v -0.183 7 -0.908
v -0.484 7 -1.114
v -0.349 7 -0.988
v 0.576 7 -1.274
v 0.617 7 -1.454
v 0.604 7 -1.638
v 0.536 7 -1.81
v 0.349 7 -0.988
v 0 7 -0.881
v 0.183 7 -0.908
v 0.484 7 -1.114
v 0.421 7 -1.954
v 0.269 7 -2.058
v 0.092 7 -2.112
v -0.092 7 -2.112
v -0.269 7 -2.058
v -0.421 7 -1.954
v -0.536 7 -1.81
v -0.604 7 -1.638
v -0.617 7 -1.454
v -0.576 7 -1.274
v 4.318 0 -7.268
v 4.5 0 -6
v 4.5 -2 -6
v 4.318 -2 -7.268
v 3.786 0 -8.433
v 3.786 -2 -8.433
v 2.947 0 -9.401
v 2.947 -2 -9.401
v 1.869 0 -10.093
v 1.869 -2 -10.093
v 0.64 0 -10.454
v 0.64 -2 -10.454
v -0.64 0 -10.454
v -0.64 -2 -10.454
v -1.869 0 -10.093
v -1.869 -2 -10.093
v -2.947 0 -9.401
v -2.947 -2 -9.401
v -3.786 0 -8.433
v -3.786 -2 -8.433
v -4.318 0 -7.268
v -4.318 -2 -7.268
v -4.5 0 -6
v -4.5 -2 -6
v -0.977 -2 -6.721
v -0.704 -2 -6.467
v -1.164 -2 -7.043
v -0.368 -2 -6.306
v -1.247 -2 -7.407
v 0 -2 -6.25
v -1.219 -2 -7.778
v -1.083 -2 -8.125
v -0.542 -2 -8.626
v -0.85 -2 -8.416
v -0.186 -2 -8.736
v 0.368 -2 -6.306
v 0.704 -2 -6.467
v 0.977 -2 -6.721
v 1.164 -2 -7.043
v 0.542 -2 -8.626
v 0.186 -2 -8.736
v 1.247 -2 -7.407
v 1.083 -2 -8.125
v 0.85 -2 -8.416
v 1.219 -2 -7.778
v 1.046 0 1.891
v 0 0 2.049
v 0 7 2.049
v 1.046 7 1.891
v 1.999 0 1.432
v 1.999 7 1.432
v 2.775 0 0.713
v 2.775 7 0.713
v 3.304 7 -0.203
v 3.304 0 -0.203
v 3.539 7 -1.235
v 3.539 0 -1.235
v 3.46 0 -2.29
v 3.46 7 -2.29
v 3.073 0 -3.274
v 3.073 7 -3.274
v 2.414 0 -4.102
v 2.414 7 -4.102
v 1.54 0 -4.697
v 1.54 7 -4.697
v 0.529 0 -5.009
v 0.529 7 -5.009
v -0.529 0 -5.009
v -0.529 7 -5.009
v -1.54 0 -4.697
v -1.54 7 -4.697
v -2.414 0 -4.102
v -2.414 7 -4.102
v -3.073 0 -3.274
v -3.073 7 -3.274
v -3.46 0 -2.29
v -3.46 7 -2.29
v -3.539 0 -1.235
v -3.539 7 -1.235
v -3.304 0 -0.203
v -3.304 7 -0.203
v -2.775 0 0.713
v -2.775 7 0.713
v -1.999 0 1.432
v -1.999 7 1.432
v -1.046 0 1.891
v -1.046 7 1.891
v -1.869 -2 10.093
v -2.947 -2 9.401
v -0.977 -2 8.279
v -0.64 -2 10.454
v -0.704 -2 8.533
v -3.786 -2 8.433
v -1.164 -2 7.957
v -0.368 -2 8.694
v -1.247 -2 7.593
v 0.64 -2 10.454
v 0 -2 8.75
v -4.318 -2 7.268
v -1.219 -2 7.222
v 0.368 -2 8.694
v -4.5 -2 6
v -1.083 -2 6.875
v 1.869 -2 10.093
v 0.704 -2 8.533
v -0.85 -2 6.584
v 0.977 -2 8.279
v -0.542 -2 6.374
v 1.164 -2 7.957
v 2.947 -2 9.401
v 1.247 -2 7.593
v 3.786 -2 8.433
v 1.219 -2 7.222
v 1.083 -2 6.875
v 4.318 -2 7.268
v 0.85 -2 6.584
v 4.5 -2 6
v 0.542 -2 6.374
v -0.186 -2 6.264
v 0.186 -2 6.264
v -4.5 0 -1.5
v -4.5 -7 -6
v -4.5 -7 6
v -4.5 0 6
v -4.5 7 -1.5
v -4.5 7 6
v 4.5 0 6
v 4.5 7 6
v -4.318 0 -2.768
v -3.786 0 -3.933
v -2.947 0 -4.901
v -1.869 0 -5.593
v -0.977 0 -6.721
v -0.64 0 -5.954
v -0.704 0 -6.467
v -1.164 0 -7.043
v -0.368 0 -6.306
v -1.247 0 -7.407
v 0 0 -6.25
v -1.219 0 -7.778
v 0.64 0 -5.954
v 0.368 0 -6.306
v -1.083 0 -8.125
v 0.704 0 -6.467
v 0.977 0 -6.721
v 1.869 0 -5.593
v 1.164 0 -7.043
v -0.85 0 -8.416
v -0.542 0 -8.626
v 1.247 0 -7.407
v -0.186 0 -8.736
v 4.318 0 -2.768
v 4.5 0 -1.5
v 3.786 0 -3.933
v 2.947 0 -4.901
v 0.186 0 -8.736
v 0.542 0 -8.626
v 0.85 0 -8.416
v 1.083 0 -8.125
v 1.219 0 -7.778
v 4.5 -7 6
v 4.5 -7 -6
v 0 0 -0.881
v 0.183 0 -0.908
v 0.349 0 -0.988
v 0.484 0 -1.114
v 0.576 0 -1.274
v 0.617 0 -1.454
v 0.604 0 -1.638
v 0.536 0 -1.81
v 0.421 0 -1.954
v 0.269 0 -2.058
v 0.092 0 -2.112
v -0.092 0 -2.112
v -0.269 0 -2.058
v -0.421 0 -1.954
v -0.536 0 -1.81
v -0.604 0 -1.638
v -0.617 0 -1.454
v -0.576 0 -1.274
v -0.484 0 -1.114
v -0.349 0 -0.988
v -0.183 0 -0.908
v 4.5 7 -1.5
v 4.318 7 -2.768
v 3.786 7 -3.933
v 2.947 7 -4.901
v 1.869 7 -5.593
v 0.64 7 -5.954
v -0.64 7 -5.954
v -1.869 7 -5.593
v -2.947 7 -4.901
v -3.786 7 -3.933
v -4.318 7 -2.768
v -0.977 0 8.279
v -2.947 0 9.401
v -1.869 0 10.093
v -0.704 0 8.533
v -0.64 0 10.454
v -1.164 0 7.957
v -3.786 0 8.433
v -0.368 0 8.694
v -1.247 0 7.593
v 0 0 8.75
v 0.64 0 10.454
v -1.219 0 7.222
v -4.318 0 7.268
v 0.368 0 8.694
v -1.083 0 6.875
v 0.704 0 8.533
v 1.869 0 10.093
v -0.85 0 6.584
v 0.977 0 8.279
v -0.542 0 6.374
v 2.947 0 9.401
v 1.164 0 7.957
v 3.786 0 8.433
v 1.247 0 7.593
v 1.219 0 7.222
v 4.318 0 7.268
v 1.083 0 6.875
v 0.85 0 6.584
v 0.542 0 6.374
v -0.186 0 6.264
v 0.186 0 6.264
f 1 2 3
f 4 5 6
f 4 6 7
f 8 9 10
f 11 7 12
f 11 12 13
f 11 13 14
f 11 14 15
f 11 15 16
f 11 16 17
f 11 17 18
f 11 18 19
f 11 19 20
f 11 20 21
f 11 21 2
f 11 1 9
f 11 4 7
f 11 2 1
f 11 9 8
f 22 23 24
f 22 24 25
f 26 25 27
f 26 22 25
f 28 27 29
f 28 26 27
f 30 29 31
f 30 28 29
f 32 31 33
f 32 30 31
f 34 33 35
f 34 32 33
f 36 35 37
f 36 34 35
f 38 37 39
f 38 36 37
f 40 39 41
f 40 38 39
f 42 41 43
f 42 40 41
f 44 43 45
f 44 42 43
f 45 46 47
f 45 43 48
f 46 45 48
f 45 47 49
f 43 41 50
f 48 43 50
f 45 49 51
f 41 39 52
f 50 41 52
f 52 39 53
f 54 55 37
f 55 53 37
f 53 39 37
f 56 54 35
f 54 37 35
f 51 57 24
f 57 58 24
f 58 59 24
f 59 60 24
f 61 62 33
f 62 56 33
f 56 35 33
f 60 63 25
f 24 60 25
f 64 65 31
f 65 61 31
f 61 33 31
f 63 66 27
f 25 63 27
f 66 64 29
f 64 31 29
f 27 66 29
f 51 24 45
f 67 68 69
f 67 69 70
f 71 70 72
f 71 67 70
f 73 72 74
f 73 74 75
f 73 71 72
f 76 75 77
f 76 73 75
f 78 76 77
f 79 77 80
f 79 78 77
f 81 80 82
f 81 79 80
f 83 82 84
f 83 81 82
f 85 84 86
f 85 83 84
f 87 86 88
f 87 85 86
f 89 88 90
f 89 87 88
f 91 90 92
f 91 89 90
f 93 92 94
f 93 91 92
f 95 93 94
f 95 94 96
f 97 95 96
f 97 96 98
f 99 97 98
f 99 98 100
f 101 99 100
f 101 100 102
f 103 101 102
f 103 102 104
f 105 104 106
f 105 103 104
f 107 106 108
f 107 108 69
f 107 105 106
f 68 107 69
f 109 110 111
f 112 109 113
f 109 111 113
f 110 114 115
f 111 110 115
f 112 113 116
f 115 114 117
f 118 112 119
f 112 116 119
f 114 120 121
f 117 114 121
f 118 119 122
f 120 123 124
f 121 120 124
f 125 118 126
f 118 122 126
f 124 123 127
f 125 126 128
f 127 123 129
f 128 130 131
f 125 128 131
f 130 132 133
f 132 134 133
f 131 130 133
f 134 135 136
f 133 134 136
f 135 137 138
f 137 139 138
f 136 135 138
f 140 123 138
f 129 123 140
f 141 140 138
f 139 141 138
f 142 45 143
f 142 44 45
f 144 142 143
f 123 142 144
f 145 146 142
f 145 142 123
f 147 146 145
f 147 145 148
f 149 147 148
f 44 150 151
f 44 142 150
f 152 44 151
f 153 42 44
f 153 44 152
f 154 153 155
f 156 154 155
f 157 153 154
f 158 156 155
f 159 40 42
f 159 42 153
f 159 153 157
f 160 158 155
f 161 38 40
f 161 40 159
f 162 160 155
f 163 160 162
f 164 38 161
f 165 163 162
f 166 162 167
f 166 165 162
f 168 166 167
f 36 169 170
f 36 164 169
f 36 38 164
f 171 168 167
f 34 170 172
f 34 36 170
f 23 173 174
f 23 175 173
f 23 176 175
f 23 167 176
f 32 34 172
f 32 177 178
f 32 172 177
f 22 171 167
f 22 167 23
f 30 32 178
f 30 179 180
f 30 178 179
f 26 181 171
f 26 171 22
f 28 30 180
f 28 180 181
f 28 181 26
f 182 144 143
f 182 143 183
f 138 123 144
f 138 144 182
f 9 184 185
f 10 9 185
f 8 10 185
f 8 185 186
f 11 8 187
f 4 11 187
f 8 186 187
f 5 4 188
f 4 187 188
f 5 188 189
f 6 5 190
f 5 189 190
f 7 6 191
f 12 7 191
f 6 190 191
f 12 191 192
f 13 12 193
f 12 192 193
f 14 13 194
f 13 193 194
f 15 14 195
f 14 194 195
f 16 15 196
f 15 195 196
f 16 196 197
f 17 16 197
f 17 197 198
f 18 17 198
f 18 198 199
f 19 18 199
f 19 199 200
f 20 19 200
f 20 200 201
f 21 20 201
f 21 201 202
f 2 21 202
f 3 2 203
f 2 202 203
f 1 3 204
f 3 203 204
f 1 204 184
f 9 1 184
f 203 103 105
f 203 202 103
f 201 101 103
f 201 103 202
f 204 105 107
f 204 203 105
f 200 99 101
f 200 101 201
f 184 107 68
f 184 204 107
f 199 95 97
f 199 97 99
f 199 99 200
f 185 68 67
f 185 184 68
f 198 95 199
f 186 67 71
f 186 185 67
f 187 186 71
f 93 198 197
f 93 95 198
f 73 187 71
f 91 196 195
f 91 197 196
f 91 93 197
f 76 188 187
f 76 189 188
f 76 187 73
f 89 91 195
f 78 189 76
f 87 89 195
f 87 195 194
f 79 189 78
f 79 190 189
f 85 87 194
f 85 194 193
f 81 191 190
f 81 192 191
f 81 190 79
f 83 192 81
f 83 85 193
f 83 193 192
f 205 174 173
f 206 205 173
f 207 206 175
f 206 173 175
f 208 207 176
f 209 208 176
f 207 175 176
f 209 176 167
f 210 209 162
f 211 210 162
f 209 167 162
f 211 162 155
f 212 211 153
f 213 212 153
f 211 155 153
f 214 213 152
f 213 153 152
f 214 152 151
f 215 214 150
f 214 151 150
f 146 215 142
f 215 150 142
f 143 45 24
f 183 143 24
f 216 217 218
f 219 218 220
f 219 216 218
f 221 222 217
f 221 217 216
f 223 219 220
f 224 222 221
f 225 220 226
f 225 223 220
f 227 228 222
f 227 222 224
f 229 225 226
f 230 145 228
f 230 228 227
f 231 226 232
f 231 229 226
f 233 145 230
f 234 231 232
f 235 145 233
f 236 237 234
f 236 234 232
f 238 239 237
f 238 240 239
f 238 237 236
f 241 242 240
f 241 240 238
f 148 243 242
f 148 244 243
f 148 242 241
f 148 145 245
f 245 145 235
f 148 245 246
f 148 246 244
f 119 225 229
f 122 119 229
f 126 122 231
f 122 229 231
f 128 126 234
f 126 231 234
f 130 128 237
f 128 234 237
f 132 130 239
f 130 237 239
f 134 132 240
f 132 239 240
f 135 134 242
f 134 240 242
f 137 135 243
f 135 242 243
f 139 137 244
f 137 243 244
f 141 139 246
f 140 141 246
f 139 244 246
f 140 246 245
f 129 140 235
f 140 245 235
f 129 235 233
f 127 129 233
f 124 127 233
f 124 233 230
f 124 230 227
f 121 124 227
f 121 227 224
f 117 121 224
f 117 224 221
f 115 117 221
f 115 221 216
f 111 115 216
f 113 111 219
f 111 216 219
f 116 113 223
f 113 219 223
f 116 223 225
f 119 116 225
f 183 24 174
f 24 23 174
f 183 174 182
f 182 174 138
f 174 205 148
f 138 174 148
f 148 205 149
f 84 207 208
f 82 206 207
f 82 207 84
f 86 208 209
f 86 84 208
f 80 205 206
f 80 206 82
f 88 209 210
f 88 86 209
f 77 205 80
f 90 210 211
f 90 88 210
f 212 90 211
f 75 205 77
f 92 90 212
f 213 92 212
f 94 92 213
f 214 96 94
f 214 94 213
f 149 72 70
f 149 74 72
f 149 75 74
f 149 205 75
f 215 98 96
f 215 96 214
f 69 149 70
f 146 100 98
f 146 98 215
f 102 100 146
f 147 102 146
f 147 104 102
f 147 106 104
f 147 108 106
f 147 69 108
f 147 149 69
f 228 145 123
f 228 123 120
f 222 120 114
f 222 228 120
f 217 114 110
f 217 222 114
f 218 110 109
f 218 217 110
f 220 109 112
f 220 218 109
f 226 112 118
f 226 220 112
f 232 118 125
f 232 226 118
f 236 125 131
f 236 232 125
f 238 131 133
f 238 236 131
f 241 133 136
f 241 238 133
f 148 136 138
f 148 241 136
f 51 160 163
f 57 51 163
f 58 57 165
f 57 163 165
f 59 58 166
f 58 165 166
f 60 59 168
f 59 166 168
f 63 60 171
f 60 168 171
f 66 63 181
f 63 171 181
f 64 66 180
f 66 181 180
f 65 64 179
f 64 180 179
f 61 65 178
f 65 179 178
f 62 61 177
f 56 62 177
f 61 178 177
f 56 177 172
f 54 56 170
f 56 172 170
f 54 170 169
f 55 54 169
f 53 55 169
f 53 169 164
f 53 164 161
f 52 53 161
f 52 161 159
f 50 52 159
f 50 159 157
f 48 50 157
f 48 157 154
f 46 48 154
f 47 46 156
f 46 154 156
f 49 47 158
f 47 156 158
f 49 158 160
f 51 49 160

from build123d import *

# Parameters (mm, degrees)
ESQUISSE1_R      = 1.25
EXTRUSION1_DEPTH = 2
ESQUISSE2_R      = 3.548892627
ESQUISSE2_R_2    = 0.619205298
EXTRUSION2_DEPTH = 7
ESQUISSE3_W      = 9
ESQUISSE3_H      = 12
EXTRUSION3_DEPTH = 5


with BuildPart() as part:
    # Esquisse1 → Extrusion1 (new body)
    with BuildSketch(Plane(origin=(0, 0, 0), x_dir=(1, 0, 0), z_dir=(0, 1, 0))):
        with BuildLine():
            Line((-4.5, 6), (-4.5, -6))
            ThreePointArc((-4.5, -6), (0, -10.5), (4.5, -6))
            Line((4.5, -6), (4.5, 6))
            ThreePointArc((4.5, 6), (0, 10.5), (-4.5, 6))
        make_face()
        with Locations(Location((0, 7.5, 0), (0, 0, 270))):
            Circle(ESQUISSE1_R, mode=Mode.SUBTRACT)
        with Locations(Location((0, -7.5, 0), (0, 0, 270))):
            Circle(ESQUISSE1_R, mode=Mode.SUBTRACT)
    extrude(amount=-EXTRUSION1_DEPTH)

    # Esquisse2 → Extrusion2 (add)
    # profile 1 of 2: a face of its own
    with BuildSketch(Plane(origin=(0, 0, 0), x_dir=(-1, 0, 0), z_dir=(0, 1, 0))):
        with BuildLine():
            Line((4.5, -1.5), (4.5, 6))
            Line((4.5, 6), (-4.5, 6))
            Line((-4.5, 6), (-4.5, -1.5))
            ThreePointArc((-4.5, -1.5), (0, -6), (4.5, -1.5))
        make_face()
        with Locations(Location((0, -1.5, 0), (0, 0, 90))):
            Circle(ESQUISSE2_R, mode=Mode.SUBTRACT)
    # profile 2 of 2: a face of its own
    with BuildSketch(Plane(origin=(0, 0, 0), x_dir=(-1, 0, 0), z_dir=(0, 1, 0))):
        with Locations(Location((0, -1.5, 0), (0, 0, 90))):
            Circle(ESQUISSE2_R_2)
    extrude(amount=EXTRUSION2_DEPTH)

    # Esquisse3 → Extrusion3 (add)
    with BuildSketch(Plane.XZ.offset(2)):
        Rectangle(ESQUISSE3_W, ESQUISSE3_H)
    extrude(amount=EXTRUSION3_DEPTH)


solid = part.part
